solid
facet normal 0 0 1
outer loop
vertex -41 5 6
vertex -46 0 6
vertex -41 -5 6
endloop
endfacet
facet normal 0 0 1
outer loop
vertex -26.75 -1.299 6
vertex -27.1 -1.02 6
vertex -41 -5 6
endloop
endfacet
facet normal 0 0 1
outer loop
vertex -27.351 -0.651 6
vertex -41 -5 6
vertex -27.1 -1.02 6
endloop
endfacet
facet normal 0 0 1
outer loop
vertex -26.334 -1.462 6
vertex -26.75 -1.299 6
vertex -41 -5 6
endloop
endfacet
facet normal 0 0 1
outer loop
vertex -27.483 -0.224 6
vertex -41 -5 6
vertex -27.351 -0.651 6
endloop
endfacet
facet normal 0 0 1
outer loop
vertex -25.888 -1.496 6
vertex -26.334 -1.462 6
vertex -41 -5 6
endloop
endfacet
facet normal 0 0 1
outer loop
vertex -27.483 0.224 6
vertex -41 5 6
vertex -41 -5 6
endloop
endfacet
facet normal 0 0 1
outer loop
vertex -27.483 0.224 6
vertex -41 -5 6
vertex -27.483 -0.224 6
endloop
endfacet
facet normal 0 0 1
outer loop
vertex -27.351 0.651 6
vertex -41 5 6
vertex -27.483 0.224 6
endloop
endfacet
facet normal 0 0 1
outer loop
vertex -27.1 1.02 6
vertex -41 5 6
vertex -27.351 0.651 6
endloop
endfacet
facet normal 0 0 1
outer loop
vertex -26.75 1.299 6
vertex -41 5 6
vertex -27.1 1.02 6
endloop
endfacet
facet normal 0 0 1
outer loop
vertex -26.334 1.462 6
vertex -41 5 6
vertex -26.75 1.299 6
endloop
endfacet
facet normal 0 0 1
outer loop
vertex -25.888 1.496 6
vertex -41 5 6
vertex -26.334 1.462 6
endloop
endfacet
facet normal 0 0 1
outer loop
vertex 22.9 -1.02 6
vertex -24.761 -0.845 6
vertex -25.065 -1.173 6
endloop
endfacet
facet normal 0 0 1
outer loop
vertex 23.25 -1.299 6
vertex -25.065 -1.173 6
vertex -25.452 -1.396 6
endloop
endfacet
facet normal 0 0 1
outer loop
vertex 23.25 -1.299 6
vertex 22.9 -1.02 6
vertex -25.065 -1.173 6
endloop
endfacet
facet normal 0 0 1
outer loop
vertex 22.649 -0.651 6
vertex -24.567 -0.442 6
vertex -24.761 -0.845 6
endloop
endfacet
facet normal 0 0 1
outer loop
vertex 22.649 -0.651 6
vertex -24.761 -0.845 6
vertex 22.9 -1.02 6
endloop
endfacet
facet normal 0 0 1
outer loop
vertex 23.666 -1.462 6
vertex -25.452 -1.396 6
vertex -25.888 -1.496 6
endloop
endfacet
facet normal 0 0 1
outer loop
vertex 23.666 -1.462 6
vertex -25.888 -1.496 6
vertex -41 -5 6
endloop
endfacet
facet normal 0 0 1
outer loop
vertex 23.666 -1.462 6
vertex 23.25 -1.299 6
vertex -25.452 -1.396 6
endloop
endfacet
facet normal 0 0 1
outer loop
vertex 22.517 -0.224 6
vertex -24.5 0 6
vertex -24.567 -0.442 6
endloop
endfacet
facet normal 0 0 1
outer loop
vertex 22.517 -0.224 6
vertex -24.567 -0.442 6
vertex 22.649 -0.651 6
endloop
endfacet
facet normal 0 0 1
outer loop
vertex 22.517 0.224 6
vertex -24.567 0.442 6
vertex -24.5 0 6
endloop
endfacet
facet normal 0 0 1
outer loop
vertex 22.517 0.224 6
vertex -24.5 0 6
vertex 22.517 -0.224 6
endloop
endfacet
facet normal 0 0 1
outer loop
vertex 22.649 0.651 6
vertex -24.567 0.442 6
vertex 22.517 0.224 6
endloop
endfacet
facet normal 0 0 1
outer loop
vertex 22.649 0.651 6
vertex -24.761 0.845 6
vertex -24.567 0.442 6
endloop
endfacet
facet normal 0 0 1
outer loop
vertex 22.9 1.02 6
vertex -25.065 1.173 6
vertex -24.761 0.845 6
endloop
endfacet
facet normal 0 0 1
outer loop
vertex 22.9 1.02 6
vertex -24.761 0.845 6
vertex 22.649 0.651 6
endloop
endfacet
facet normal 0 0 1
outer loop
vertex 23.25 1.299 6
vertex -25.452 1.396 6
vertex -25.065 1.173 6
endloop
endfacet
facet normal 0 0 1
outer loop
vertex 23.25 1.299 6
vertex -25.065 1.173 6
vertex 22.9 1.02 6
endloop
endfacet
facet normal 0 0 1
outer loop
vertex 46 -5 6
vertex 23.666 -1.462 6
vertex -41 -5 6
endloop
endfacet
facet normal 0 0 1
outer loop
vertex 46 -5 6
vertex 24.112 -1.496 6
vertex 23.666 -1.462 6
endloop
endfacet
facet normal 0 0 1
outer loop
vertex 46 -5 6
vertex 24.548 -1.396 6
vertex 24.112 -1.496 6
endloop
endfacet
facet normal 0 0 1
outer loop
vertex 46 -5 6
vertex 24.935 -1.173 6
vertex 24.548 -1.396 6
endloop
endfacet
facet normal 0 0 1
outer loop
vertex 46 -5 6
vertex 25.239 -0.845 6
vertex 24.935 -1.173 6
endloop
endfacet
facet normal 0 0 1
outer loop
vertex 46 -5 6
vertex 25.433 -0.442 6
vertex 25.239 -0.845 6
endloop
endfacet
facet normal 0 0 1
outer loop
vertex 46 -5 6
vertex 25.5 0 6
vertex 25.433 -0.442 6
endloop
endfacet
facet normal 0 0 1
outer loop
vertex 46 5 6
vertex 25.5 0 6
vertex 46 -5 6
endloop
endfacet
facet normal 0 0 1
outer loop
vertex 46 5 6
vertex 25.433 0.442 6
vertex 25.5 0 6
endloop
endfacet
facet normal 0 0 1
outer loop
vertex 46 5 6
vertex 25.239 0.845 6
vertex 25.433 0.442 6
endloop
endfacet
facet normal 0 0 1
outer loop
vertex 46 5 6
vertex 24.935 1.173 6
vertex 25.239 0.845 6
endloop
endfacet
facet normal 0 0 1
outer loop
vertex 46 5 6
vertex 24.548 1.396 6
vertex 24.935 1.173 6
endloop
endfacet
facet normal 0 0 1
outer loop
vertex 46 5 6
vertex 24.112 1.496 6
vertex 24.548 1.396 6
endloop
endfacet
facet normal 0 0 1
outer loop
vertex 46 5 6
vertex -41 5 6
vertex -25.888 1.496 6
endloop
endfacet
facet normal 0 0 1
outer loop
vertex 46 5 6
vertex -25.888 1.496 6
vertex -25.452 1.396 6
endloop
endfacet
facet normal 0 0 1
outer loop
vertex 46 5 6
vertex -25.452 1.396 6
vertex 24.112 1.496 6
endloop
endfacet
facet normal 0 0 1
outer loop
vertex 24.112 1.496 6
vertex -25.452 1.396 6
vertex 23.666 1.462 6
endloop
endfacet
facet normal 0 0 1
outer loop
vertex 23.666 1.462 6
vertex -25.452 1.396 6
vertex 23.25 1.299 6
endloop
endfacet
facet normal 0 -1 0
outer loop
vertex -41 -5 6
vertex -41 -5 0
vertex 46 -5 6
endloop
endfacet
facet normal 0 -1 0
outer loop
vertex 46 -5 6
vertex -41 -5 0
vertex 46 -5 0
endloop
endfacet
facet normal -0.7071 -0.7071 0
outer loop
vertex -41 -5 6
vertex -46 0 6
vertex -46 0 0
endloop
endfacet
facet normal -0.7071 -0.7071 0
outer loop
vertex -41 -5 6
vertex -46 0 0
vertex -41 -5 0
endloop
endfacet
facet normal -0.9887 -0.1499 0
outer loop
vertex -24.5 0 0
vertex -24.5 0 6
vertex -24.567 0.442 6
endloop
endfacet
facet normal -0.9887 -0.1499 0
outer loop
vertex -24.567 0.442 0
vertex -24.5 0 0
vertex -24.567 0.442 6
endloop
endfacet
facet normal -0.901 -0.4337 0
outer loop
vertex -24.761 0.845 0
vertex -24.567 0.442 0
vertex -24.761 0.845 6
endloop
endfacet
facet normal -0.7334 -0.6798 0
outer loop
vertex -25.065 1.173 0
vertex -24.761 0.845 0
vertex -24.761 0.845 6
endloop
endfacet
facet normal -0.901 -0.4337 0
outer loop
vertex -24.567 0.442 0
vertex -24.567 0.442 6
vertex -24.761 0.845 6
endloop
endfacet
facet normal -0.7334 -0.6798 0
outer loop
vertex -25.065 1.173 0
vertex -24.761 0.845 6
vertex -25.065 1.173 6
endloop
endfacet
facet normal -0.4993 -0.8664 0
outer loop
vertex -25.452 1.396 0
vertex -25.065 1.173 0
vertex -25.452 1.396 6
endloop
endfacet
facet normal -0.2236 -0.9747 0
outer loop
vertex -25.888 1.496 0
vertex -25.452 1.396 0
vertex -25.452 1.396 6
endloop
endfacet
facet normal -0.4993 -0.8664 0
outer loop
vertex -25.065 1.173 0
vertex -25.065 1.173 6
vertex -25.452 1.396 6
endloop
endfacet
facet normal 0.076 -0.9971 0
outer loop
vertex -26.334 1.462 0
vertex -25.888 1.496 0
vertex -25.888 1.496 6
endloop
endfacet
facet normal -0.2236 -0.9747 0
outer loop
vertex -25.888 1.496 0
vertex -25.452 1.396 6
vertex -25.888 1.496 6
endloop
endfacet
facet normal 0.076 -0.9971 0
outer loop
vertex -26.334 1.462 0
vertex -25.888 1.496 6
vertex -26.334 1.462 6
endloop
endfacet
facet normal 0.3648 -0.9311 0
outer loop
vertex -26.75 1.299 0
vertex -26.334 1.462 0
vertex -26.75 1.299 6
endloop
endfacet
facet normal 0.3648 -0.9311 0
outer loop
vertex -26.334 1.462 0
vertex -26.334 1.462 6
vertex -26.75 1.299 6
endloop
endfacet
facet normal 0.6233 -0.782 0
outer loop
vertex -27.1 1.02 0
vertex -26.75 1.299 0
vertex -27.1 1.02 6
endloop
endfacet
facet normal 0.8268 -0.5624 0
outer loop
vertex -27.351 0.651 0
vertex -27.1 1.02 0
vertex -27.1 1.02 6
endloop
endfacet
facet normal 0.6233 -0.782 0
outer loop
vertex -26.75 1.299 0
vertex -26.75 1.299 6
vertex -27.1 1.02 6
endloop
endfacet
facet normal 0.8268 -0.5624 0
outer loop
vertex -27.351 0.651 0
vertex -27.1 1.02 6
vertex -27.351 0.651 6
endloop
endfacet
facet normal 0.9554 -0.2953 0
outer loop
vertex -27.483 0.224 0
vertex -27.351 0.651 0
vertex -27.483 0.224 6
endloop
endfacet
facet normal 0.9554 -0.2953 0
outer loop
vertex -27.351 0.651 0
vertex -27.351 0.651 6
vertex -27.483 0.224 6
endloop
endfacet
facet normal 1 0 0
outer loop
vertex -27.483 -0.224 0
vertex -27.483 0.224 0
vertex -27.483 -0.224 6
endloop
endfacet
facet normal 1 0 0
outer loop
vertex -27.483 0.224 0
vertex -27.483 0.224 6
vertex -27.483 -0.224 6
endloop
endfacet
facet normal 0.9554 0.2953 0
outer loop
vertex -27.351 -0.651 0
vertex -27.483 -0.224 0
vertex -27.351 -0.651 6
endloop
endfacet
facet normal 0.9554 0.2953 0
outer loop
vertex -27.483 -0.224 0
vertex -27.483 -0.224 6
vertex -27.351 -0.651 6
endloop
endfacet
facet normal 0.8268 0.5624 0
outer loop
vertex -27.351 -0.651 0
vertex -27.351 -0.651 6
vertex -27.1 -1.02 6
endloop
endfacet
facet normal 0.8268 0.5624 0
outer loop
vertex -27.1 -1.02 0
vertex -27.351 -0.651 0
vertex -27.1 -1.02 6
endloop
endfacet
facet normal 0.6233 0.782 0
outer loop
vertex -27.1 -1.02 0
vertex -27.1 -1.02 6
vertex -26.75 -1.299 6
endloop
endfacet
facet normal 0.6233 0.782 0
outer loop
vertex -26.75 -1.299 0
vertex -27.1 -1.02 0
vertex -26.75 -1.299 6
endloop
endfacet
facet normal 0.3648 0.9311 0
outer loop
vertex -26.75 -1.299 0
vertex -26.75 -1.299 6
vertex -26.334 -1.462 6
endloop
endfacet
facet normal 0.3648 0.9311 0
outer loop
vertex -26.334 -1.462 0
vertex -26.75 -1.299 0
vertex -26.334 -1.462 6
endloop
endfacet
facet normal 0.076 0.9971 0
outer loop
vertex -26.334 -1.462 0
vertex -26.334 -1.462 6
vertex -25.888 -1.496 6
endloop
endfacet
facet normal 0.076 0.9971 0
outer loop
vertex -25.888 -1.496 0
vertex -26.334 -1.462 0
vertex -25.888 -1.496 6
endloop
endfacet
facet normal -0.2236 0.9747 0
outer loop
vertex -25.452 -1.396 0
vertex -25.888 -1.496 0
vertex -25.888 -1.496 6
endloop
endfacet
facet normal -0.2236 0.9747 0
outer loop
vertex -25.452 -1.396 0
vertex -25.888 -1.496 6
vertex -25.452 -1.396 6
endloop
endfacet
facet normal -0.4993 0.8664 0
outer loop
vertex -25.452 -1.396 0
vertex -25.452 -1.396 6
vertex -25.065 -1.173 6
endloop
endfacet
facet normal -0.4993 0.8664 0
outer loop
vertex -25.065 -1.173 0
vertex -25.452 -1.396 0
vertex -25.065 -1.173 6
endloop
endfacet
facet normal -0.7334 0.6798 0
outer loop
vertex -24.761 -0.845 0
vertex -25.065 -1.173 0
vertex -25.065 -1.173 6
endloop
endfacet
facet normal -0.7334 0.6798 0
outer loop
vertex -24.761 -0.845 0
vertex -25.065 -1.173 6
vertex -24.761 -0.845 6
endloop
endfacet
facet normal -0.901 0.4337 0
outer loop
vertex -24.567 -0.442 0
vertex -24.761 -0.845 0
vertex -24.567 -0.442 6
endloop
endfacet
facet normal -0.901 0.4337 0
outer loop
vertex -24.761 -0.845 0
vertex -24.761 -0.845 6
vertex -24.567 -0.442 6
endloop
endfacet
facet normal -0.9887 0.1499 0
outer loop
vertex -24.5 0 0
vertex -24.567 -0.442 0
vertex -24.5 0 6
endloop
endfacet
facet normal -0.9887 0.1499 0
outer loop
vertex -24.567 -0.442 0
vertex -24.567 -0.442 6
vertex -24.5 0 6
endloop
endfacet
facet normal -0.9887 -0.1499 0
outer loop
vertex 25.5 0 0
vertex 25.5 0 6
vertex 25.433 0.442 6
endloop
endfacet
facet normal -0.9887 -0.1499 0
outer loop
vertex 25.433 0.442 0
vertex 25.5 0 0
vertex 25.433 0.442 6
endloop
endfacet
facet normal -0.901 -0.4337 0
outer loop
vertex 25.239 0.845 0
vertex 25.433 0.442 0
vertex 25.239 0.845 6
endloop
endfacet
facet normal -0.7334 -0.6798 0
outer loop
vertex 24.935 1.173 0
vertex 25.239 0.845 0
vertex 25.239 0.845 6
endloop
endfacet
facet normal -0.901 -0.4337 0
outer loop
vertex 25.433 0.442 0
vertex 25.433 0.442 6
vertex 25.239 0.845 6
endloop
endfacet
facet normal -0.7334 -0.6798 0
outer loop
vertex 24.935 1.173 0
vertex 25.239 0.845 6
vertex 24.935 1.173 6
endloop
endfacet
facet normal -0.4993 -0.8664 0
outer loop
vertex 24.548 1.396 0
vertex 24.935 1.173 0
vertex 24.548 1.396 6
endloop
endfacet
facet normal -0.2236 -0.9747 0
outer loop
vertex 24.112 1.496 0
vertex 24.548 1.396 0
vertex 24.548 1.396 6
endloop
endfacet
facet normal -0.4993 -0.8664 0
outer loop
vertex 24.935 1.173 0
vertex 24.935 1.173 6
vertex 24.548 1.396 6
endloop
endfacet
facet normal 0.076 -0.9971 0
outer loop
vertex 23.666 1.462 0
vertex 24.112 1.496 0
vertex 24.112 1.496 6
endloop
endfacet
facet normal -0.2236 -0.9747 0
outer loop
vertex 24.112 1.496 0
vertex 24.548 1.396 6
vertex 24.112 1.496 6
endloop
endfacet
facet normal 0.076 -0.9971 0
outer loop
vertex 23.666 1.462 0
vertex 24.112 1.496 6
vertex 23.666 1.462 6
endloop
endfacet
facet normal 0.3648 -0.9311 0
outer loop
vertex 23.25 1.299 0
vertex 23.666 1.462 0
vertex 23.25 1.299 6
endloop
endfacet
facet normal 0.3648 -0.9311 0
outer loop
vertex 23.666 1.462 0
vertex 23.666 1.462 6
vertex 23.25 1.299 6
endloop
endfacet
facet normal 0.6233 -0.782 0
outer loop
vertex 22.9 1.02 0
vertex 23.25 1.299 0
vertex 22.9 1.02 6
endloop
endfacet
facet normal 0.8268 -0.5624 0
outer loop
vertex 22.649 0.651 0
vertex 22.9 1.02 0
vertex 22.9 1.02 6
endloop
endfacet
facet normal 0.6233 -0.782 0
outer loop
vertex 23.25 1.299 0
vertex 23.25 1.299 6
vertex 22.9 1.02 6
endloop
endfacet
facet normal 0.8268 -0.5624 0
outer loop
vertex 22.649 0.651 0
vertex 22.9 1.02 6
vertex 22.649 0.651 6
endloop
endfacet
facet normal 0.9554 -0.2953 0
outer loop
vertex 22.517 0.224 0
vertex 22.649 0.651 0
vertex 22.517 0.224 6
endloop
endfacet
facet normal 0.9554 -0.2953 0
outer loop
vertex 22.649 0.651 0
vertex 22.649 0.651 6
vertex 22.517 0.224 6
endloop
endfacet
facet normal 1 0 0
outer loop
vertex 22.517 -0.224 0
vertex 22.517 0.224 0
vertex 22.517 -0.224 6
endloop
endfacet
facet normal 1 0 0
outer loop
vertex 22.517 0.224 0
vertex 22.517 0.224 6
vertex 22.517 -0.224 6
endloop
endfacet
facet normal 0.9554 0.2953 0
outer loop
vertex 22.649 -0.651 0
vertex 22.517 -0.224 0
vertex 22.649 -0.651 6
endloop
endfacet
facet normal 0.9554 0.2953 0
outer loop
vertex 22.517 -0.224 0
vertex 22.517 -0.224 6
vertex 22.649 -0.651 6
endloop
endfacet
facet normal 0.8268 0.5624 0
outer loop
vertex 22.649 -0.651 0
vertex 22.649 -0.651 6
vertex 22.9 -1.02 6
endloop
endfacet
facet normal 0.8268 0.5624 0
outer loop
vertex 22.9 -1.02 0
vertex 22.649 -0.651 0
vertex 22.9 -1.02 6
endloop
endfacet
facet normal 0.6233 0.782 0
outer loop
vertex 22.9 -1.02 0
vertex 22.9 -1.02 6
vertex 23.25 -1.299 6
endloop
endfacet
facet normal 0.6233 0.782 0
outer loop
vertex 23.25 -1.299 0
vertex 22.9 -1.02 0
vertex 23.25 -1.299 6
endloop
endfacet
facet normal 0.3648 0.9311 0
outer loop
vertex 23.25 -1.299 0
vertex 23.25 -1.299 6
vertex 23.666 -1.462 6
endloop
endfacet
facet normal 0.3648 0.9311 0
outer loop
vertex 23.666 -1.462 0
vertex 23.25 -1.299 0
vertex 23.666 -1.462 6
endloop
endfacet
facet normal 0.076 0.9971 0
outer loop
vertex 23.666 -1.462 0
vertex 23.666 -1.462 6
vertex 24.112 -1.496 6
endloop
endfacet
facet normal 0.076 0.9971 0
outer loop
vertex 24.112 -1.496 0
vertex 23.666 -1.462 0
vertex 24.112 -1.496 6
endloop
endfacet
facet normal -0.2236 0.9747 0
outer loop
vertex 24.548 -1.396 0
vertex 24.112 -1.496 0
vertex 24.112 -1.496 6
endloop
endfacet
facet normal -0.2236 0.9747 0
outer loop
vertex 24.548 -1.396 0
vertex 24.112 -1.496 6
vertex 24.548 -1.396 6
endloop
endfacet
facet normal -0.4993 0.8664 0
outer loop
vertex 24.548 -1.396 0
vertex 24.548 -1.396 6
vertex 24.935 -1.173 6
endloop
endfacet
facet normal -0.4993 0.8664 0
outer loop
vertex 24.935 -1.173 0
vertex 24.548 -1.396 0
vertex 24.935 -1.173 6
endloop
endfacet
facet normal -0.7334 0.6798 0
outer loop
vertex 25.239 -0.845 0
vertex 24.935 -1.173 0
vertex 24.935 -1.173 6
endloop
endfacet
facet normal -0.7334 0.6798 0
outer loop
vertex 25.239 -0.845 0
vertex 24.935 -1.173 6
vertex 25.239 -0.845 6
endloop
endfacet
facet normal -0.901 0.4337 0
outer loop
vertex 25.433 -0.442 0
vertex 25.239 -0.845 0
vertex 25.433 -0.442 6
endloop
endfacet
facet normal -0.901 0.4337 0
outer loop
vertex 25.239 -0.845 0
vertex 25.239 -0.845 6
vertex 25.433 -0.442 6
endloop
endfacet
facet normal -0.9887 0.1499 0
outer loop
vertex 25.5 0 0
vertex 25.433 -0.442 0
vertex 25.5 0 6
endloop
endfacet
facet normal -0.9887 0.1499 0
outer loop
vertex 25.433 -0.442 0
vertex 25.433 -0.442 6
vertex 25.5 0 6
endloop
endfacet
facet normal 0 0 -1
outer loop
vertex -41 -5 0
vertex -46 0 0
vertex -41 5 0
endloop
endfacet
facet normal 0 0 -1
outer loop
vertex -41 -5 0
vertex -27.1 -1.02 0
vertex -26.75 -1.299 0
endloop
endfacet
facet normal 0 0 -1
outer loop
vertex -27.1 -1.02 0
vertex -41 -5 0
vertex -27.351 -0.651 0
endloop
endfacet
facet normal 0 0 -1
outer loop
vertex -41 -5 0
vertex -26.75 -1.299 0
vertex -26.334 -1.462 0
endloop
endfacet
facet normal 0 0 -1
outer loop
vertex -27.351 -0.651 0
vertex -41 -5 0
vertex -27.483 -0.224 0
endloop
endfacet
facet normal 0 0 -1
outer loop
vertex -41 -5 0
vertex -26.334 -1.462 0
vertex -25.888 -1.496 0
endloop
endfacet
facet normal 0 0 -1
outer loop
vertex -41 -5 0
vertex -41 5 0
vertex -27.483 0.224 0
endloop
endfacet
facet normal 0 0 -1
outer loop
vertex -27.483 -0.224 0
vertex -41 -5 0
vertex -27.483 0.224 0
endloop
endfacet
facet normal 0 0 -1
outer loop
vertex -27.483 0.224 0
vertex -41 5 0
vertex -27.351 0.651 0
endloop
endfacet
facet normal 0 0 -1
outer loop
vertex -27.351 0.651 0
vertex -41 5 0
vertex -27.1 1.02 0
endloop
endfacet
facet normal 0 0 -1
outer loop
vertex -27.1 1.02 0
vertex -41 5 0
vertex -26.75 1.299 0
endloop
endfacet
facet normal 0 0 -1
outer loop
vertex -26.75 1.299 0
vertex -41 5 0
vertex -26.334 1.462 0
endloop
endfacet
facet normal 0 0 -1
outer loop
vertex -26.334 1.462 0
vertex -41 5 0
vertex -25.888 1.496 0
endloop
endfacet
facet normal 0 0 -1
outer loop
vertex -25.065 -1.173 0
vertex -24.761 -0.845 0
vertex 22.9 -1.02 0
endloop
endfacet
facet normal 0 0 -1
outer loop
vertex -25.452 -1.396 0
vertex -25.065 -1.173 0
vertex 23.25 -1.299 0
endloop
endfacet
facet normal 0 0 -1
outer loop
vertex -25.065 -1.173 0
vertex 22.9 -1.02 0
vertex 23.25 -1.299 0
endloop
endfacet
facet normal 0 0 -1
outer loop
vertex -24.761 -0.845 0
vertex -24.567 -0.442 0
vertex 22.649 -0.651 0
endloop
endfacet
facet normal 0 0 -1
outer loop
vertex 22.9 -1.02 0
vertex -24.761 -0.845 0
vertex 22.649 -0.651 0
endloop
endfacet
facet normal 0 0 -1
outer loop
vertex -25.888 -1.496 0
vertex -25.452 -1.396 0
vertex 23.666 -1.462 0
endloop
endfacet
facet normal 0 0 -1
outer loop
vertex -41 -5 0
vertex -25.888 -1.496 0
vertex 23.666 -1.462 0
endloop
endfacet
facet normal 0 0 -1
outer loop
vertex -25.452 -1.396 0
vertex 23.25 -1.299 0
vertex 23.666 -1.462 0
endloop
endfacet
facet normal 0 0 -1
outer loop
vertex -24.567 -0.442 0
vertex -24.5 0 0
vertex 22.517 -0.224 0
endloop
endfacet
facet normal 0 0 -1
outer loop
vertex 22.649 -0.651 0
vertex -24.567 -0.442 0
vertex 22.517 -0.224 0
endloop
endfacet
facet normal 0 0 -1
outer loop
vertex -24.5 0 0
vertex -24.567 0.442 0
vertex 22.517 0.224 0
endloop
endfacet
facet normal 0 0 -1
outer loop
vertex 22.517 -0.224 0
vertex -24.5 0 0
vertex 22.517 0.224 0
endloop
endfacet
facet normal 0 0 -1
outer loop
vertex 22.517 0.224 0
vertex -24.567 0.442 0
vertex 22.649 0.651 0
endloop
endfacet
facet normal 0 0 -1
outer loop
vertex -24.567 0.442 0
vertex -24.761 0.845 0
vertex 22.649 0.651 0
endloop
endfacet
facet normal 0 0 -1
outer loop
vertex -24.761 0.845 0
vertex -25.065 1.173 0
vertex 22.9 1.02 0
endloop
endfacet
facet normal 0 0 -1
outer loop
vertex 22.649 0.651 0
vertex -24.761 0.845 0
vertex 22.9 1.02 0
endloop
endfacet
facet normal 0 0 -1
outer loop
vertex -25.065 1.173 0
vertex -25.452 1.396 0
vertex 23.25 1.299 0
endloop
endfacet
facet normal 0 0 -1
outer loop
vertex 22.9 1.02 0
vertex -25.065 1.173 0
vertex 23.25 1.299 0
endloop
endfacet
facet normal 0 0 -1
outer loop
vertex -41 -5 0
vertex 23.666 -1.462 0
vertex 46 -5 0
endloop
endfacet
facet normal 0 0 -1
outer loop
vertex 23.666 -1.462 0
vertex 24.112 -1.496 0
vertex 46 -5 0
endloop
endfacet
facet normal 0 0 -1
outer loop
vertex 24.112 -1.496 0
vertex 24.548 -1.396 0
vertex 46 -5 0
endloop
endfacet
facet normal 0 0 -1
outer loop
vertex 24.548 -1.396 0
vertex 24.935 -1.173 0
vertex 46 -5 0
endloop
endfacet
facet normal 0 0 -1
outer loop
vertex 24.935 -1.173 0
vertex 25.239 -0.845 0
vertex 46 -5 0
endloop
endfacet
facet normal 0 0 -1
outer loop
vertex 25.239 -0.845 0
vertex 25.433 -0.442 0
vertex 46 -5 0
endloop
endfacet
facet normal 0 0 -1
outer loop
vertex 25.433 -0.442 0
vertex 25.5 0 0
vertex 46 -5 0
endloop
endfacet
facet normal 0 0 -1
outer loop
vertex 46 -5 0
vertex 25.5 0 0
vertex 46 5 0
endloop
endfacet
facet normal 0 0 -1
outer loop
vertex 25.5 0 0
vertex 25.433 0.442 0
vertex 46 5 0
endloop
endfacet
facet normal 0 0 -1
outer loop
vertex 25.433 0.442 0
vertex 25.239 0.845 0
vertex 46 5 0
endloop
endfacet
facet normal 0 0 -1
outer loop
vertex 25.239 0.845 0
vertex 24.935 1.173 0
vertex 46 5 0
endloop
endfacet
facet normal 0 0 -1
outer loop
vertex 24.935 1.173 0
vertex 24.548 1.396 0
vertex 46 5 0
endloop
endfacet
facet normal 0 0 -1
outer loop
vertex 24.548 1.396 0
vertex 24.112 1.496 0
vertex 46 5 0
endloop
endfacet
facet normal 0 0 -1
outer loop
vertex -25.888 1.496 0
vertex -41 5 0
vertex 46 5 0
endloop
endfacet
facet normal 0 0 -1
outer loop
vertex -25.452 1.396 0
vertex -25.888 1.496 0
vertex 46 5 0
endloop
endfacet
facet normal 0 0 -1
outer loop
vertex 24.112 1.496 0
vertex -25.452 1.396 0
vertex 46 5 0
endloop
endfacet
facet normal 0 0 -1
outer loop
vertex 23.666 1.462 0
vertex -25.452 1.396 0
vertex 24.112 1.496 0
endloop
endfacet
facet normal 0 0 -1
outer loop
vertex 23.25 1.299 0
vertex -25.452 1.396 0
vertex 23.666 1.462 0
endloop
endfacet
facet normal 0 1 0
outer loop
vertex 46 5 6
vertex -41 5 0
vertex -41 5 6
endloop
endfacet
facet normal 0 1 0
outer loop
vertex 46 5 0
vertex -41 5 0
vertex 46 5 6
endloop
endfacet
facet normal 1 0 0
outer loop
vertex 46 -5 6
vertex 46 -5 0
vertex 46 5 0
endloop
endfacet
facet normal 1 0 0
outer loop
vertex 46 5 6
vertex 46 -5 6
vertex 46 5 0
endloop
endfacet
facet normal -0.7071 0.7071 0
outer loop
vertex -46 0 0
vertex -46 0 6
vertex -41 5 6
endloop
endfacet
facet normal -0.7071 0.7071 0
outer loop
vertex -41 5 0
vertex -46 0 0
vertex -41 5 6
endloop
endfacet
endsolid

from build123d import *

# Parameters (mm, degrees)
ESQUISSE1_W             = 92
ESQUISSE1_H             = 10
BOSS_EXTRU_1_DEPTH      = 6
ENL_V_MAT_EXTRU_1_DEPTH = 6
ENL_V_MAT_EXTRU_2_DEPTH = 6
ESQUISSE4_R             = 1.5
ENL_V_MAT_EXTRU_3_DEPTH = 6


with BuildPart() as part:
    # Esquisse1 → Boss.-Extru.1 (new body)
    with BuildSketch(Plane.XY):
        Rectangle(ESQUISSE1_W, ESQUISSE1_H)
    extrude(amount=BOSS_EXTRU_1_DEPTH)

    # Esquisse2 → Enlèv. mat.-Extru.1 (cut)
    with BuildSketch(Plane.XY.offset(6)):
        Polygon((-46, -5), (-46, 0), (-41, -5), align=None)
    extrude(amount=-ENL_V_MAT_EXTRU_1_DEPTH, mode=Mode.SUBTRACT)

    # Esquisse3 → Enlèv. mat.-Extru.2 (cut)
    with BuildSketch(Plane.XY.offset(6)):
        Polygon((-46, 0), (-41, 5), (-46, 5), align=None)
    extrude(amount=-ENL_V_MAT_EXTRU_2_DEPTH, mode=Mode.SUBTRACT)

    # Esquisse4 → Enlèv. mat.-Extru.3 (cut)
    with BuildSketch(Plane.XY.offset(6)):
        with Locations((-26, 0)):
            Circle(ESQUISSE4_R)
        with Locations((24, 0)):
            Circle(ESQUISSE4_R)
    extrude(amount=-ENL_V_MAT_EXTRU_3_DEPTH, mode=Mode.SUBTRACT)


solid = part.part
